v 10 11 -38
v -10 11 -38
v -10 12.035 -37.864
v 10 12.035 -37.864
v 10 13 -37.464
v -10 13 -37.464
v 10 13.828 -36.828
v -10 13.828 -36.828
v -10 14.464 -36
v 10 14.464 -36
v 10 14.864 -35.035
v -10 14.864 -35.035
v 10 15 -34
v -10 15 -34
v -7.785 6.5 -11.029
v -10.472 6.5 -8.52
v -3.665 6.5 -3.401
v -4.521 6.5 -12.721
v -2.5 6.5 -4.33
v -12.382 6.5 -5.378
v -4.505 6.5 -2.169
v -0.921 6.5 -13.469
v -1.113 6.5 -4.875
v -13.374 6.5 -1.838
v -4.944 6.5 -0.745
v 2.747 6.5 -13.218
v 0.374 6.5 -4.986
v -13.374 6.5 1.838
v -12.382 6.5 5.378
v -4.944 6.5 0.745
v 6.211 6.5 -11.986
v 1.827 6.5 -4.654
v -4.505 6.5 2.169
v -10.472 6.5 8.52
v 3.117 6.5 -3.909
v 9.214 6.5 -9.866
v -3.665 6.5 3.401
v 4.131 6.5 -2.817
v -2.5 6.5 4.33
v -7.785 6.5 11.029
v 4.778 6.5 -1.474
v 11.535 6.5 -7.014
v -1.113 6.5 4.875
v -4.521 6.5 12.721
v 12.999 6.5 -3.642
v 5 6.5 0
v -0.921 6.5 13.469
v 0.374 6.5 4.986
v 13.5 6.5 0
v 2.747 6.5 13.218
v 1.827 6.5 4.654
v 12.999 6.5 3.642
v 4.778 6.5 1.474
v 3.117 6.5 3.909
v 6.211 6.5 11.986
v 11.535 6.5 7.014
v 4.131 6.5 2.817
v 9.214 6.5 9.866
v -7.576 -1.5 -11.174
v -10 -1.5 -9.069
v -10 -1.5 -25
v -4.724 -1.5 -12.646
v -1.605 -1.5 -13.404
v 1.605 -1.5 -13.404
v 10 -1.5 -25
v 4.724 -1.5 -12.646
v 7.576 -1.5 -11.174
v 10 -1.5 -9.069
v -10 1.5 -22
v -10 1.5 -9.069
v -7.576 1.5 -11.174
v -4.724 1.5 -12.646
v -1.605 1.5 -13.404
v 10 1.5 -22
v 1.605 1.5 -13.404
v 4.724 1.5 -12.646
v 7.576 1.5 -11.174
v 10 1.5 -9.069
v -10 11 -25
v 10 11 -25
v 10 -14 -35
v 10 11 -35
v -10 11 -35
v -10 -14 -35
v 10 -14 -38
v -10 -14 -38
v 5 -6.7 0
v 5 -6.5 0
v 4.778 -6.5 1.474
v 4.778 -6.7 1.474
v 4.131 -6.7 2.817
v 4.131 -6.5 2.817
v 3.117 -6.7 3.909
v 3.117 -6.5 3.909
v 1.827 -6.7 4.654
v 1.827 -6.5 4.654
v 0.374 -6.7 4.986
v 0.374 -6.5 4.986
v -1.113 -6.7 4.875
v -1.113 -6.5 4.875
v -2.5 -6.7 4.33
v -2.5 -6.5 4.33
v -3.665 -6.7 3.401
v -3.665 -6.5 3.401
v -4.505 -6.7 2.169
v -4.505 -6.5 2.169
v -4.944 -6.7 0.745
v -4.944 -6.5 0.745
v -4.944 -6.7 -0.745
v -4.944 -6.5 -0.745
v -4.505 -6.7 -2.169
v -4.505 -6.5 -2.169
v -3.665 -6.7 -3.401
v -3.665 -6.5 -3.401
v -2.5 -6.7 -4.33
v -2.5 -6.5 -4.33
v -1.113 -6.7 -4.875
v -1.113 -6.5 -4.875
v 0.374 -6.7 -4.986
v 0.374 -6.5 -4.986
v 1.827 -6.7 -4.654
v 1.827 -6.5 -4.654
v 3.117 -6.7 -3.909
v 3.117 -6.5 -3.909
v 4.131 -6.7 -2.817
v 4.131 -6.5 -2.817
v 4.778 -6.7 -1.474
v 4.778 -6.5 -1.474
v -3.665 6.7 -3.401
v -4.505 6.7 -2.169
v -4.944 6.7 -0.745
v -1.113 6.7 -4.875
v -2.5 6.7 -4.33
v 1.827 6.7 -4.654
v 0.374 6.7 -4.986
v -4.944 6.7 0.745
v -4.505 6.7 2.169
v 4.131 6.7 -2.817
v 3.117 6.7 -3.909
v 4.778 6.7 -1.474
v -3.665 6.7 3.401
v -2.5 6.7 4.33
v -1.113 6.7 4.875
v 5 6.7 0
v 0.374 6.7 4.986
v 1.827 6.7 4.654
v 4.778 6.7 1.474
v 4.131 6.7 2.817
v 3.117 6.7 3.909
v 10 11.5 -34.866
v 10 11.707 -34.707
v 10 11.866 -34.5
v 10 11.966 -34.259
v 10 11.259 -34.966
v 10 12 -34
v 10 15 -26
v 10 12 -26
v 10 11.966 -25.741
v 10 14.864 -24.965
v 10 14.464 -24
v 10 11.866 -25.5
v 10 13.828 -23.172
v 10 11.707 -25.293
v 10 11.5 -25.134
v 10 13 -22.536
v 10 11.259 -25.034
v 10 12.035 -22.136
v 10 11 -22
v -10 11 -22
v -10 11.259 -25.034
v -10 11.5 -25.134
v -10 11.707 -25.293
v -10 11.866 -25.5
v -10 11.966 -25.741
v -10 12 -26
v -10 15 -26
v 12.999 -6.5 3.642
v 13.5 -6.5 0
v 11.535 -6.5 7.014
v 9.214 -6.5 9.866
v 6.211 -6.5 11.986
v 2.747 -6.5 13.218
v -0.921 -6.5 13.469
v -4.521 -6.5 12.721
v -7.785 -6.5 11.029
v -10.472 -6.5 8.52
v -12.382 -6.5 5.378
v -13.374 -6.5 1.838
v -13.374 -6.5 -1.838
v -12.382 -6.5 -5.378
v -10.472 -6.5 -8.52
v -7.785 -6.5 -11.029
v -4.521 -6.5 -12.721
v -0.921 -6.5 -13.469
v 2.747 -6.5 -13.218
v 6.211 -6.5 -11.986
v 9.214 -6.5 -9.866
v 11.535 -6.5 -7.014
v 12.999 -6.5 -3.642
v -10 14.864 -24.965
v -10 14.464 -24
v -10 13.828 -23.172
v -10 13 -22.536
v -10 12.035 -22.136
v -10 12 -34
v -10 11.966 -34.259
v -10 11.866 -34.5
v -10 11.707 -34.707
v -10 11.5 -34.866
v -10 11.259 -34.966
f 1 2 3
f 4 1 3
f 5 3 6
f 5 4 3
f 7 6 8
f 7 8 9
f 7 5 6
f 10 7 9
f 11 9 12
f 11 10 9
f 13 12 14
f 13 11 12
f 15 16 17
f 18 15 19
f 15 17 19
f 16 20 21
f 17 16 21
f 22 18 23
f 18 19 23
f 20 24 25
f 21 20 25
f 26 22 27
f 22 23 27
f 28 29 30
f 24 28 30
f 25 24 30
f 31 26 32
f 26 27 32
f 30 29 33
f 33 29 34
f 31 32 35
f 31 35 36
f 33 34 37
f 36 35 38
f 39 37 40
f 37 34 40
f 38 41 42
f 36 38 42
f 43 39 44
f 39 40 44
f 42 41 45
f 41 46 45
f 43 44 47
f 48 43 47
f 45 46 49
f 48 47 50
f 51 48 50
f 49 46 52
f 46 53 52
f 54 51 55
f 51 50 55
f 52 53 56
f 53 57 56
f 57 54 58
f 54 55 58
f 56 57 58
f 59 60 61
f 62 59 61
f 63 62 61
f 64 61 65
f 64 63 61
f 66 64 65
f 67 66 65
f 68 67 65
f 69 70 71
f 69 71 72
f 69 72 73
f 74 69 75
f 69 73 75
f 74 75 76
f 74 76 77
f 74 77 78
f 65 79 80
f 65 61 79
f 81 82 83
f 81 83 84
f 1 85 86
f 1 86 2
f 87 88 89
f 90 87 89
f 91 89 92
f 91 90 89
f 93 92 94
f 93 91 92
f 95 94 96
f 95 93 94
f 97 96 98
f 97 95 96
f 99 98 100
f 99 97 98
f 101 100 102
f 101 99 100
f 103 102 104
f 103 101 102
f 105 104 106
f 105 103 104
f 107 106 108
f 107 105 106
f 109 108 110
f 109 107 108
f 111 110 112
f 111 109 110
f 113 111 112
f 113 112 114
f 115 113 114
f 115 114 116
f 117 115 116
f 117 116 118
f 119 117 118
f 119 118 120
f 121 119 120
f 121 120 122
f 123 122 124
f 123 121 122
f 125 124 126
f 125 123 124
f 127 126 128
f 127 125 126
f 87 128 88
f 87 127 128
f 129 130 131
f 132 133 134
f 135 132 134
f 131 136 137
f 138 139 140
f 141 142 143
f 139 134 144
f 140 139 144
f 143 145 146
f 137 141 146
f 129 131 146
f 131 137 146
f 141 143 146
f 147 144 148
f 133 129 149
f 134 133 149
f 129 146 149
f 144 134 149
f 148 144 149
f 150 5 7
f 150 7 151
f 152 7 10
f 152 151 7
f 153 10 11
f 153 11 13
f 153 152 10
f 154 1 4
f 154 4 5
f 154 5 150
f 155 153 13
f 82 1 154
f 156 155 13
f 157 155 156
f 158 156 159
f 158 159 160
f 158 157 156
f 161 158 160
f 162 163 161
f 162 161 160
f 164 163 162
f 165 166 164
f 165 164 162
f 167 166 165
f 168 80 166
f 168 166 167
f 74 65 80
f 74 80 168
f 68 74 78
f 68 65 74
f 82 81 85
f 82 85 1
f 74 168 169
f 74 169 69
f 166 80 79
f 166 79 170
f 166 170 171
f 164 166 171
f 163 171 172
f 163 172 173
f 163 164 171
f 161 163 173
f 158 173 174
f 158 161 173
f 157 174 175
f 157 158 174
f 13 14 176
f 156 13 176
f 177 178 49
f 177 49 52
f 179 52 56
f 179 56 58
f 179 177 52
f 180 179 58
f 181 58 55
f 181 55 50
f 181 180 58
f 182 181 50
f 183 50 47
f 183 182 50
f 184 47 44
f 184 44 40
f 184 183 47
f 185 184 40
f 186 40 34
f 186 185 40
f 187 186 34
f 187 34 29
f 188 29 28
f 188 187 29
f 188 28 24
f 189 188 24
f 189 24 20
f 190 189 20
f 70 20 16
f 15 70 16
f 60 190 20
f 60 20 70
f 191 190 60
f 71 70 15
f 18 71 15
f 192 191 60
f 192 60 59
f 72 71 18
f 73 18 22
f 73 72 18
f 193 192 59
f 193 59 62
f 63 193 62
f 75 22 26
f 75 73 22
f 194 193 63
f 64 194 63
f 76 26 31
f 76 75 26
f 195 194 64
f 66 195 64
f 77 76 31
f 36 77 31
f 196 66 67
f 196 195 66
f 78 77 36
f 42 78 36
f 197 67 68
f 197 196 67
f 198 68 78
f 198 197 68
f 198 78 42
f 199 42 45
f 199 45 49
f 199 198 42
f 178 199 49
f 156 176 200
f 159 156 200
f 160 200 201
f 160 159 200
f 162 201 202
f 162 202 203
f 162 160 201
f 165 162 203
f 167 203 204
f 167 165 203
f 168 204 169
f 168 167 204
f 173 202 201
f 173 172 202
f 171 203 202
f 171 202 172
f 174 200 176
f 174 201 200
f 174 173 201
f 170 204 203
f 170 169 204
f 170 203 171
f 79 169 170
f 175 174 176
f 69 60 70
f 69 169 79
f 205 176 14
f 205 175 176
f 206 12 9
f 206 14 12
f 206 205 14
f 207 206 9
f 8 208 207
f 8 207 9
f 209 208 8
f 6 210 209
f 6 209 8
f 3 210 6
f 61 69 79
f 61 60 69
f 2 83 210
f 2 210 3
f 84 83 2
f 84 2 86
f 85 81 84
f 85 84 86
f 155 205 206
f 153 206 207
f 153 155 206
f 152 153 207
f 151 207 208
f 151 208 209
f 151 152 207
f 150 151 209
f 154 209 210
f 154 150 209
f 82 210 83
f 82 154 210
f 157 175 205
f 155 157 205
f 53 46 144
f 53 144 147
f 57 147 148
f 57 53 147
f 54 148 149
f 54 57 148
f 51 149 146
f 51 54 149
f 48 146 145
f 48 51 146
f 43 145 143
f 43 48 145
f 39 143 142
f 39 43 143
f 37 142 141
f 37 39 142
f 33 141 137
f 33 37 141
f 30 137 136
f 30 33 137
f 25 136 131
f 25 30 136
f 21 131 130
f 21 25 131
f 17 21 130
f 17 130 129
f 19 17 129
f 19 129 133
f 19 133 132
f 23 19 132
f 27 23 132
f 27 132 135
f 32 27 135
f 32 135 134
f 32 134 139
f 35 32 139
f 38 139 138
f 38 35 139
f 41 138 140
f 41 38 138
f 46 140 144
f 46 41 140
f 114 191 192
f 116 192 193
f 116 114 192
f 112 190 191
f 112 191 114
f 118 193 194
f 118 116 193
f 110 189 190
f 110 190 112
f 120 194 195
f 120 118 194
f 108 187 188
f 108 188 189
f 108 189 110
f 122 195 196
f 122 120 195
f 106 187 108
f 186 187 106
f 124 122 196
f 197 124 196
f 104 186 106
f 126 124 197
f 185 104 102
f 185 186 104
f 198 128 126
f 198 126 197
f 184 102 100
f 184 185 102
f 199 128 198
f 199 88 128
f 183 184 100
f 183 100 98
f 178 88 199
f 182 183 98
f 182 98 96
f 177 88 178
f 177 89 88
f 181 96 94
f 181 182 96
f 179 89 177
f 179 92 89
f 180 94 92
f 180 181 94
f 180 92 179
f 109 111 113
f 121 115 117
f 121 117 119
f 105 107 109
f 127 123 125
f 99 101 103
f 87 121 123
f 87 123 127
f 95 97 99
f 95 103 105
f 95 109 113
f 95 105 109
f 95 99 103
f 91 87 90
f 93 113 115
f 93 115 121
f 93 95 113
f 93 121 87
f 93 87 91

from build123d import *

# Parameters (mm, degrees)
F0_R     = 13.5
F0_R_2   = 5
F1_DEPTH = 6.5
F2_DEPTH = 6.7
F3_R     = 5
F4_DEPTH = 1.5
F6_DEPTH = 10


with BuildPart() as f1:
    # F0 (on Front) → F1 (new body, symmetric)
    with BuildSketch(Plane.XZ):
        Circle(F0_R)
        Circle(F0_R_2, mode=Mode.SUBTRACT)
    extrude(amount=F1_DEPTH, both=True)

    # F0 (on Front) → F2 (join, symmetric)
    with BuildSketch(Plane.XZ):
        Circle(F0_R_2)
    extrude(amount=F2_DEPTH, both=True)

    # F3 (on Front) → F4 (join, symmetric)
    with BuildSketch(Plane.XZ):
        with BuildLine():
            Line((10, -25), (10, 0))
            ThreePointArc((10, 0), (0, 10), (-10, 0))
            Line((-10, 0), (-10, -25))
            Line((-10, -25), (10, -25))
        make_face()
        Circle(F3_R, mode=Mode.SUBTRACT)
    extrude(amount=F4_DEPTH, both=True)

    # F5 (on Right) → F6 (join, symmetric)
    with BuildSketch(Plane.YZ):
        with BuildLine():
            Line((0, -22), (0, -25))
            Line((0, -25), (1.5, -25))
            Line((1.5, -25), (11, -25))
            ThreePointArc((11, -25), (11.7071067812, -25.2928932188), (12, -26))
            Line((12, -26), (12, -34))
            ThreePointArc((12, -34), (11.7071067812, -34.7071067812), (11, -35))
            Line((11, -35), (-14, -35))
            Line((-14, -35), (-14, -38))
            Line((-14, -38), (11, -38))
            ThreePointArc((11, -38), (13.8284271247, -36.8284271247), (15, -34))
            Line((15, -34), (15, -26))
            ThreePointArc((15, -26), (13.8284271247, -23.1715728753), (11, -22))
            Line((11, -22), (0, -22))
        make_face()
    extrude(amount=F6_DEPTH, both=True)


solid = f1.part
